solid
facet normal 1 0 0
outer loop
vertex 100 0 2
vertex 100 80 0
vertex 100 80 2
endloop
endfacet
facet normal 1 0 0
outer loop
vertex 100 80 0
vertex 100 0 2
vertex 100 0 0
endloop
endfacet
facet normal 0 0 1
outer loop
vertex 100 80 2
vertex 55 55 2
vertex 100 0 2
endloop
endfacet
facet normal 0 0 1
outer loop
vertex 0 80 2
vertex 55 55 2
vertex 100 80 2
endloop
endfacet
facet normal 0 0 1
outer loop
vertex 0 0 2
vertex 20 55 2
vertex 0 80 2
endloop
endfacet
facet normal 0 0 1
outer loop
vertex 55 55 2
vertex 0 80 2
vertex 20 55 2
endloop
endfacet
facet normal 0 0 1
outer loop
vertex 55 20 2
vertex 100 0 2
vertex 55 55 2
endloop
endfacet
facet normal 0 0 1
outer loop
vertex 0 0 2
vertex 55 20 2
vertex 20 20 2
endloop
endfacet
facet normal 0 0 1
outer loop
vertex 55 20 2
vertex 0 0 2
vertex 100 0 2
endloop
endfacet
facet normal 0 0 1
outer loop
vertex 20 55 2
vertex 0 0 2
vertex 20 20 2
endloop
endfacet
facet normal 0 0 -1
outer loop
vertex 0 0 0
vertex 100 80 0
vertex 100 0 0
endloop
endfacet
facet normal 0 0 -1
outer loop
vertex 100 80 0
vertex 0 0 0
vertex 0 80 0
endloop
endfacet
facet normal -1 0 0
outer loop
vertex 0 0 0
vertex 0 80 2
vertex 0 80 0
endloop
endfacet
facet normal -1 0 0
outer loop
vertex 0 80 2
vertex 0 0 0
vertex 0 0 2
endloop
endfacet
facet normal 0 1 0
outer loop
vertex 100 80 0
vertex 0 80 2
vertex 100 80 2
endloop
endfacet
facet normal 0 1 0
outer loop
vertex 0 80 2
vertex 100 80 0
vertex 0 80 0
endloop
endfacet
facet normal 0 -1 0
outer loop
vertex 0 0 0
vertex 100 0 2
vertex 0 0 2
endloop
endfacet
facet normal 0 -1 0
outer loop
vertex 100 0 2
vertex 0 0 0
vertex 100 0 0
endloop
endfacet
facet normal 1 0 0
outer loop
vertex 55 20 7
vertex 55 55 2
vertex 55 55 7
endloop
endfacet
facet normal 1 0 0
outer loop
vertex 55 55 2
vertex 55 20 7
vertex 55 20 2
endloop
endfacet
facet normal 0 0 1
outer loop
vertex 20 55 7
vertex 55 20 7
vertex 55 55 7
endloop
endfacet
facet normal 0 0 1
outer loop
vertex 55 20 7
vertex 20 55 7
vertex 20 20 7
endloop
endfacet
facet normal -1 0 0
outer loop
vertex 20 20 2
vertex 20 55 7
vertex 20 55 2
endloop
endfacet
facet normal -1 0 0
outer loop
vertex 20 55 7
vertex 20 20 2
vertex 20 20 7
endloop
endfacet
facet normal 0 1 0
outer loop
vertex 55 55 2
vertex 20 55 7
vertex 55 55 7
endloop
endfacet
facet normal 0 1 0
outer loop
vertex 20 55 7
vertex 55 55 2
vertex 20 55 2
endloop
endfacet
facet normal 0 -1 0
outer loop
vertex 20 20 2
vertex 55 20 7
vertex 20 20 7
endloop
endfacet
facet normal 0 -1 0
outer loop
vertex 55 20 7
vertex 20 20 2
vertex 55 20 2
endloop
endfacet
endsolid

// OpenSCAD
// Concept only. Provisional dimensions in mm.
$fn=32;
cube([100,80,2]);translate([20,20,2])cube([35,35,5]);
